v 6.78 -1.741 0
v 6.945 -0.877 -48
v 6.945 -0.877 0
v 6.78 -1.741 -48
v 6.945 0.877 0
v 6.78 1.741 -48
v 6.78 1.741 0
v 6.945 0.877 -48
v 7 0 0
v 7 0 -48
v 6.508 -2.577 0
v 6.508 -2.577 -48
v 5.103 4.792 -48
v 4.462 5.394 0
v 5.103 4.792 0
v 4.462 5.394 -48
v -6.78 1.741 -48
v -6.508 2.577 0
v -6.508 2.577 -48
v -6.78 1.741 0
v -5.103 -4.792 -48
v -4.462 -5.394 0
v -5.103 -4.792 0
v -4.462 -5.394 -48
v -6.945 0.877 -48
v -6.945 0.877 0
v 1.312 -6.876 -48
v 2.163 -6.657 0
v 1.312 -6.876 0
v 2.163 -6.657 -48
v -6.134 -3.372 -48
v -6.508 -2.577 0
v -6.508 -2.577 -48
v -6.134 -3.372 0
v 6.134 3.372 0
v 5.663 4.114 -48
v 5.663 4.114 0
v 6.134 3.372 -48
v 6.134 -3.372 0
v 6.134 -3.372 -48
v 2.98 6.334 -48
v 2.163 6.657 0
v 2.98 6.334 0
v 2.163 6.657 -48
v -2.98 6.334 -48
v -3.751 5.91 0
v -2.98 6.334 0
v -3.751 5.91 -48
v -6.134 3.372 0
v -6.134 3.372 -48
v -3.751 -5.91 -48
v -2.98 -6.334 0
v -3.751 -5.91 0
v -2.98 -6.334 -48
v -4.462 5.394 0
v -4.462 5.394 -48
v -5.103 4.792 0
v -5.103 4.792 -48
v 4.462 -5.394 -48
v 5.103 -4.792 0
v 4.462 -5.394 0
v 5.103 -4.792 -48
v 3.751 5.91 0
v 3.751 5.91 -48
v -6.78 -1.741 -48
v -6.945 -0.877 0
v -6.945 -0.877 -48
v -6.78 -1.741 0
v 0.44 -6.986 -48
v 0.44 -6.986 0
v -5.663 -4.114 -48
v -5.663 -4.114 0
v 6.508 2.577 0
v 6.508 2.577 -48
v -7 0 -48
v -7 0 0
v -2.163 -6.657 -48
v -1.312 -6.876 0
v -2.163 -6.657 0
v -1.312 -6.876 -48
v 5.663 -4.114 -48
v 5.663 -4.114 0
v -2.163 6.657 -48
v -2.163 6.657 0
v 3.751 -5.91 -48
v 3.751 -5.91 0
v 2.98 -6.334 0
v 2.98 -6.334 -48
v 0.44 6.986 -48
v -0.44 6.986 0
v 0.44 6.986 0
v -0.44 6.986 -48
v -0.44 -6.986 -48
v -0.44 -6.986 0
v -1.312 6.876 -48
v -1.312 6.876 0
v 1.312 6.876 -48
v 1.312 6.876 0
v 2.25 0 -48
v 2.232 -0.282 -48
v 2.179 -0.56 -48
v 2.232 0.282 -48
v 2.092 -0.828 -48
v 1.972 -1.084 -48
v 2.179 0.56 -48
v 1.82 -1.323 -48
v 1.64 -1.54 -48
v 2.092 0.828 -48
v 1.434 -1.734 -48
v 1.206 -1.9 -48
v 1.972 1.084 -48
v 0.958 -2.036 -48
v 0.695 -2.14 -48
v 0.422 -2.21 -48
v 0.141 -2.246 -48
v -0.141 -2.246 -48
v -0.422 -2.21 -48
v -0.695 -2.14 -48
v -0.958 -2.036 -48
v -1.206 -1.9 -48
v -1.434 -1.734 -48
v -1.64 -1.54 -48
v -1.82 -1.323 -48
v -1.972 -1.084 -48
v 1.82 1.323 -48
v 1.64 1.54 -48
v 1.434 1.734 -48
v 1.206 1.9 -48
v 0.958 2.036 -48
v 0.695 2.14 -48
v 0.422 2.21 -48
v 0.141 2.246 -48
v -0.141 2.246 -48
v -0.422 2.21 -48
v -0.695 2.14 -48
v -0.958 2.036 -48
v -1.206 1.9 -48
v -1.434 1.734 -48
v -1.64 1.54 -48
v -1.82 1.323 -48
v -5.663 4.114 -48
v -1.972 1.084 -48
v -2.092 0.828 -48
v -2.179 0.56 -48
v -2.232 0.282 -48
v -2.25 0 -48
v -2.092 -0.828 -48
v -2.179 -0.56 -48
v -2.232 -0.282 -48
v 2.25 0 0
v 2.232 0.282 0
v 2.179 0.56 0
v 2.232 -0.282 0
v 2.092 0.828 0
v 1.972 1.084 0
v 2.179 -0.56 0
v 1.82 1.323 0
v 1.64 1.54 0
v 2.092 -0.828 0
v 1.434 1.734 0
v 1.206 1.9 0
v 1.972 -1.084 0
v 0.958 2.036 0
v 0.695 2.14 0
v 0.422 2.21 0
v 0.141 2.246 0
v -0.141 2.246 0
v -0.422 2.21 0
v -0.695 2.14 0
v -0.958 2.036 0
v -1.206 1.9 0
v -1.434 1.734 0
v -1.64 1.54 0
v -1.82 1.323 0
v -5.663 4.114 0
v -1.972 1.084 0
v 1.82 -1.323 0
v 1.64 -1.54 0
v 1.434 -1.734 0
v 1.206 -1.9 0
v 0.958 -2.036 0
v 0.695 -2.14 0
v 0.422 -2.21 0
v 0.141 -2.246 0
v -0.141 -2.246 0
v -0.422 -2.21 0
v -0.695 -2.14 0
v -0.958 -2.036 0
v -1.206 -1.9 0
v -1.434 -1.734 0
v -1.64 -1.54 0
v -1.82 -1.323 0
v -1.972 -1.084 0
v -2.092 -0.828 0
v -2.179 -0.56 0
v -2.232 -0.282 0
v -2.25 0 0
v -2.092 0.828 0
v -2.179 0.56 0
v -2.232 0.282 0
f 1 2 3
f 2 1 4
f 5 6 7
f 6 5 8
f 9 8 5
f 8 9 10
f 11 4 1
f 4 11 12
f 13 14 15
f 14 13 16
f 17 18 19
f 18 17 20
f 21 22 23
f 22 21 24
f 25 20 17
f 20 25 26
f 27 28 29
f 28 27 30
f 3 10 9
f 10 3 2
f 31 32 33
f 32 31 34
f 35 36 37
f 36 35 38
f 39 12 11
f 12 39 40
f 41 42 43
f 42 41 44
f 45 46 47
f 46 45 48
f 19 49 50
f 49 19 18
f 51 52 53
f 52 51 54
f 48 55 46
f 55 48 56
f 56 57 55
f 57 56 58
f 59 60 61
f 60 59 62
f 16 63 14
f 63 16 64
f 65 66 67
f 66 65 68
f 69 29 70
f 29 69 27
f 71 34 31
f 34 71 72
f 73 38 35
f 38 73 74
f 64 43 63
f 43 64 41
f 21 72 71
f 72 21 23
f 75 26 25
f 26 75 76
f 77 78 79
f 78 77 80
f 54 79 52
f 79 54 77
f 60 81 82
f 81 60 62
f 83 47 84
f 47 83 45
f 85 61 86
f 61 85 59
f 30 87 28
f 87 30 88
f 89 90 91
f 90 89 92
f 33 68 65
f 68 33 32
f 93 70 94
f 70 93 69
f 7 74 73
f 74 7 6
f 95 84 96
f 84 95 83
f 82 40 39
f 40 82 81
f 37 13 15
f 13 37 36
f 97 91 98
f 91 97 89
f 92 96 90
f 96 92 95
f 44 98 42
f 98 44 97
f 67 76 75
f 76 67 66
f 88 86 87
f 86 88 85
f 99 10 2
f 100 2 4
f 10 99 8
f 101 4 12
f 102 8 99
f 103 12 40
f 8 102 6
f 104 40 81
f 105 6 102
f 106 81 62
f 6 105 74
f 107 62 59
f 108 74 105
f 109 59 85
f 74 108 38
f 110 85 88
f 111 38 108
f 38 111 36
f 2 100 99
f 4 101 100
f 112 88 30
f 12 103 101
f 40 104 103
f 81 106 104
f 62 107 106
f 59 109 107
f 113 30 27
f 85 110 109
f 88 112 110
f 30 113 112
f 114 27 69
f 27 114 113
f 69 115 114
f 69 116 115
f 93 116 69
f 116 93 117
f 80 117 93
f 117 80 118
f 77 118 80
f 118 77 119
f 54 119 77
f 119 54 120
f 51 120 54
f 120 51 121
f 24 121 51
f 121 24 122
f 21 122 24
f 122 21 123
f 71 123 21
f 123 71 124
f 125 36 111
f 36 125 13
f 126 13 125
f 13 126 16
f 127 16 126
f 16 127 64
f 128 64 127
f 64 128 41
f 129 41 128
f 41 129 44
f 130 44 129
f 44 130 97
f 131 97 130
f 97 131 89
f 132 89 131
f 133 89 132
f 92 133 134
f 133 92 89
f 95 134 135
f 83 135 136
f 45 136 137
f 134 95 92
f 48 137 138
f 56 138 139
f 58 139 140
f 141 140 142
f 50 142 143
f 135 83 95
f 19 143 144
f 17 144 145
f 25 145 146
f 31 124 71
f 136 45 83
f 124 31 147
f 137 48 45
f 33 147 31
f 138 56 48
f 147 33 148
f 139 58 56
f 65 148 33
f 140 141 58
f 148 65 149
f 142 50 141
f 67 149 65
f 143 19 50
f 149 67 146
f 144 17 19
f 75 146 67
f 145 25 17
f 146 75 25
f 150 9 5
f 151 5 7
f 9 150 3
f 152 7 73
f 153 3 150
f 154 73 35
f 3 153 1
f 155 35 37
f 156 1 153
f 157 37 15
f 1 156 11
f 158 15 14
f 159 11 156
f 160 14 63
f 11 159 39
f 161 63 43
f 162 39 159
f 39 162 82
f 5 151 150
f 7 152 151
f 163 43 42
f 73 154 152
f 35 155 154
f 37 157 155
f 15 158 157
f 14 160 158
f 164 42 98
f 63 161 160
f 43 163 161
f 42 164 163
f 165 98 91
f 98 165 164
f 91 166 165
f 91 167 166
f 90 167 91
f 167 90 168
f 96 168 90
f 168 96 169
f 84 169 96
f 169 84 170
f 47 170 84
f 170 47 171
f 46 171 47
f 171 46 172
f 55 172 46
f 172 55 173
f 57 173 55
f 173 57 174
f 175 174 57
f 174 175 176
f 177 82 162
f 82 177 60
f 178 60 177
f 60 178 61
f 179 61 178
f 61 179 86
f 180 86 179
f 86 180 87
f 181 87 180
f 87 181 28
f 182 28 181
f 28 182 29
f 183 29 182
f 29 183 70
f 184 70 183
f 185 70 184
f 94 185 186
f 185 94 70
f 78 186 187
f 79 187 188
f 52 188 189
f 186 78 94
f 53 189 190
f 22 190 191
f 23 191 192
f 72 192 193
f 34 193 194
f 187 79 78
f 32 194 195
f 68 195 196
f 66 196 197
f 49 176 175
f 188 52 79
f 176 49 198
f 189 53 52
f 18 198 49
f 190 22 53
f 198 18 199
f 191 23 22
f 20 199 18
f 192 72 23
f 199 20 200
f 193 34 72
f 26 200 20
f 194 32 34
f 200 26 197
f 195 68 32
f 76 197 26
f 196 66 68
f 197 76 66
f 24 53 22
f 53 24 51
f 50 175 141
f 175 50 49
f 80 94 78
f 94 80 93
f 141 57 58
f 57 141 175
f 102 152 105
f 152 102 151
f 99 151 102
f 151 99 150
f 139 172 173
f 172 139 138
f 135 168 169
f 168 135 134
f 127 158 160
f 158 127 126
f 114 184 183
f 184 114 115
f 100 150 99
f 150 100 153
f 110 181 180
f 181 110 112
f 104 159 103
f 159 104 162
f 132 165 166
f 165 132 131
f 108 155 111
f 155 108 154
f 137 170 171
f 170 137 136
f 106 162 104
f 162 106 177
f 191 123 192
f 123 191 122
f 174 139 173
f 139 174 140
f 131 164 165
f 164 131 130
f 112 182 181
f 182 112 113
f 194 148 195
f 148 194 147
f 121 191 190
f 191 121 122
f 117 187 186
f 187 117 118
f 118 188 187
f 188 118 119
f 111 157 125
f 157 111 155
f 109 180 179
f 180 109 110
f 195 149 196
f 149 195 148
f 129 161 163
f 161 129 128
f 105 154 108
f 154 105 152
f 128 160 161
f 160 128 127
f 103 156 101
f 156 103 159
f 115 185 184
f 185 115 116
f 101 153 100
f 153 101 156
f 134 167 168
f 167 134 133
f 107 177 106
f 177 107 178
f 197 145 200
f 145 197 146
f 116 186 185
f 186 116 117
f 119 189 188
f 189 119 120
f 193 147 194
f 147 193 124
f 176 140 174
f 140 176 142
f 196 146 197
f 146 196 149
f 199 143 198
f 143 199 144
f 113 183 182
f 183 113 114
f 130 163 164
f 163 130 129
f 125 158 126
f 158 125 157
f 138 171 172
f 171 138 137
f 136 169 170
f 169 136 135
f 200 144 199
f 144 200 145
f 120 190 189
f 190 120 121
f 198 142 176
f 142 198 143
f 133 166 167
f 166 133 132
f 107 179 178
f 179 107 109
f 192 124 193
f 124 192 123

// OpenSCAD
$fn = 50;


difference() {
	union() {
		translate(v = [0, 0, -48.0000000000]) {
			cylinder(h = 48, r = 7.0000000000);
		}
		cylinder(h = 0, r = 10.0000000000);
	}
	union() {
		#translate(v = [0, 0, -48]) {
			cylinder(h = 48, r = 2.2500000000);
		}
	}
}
